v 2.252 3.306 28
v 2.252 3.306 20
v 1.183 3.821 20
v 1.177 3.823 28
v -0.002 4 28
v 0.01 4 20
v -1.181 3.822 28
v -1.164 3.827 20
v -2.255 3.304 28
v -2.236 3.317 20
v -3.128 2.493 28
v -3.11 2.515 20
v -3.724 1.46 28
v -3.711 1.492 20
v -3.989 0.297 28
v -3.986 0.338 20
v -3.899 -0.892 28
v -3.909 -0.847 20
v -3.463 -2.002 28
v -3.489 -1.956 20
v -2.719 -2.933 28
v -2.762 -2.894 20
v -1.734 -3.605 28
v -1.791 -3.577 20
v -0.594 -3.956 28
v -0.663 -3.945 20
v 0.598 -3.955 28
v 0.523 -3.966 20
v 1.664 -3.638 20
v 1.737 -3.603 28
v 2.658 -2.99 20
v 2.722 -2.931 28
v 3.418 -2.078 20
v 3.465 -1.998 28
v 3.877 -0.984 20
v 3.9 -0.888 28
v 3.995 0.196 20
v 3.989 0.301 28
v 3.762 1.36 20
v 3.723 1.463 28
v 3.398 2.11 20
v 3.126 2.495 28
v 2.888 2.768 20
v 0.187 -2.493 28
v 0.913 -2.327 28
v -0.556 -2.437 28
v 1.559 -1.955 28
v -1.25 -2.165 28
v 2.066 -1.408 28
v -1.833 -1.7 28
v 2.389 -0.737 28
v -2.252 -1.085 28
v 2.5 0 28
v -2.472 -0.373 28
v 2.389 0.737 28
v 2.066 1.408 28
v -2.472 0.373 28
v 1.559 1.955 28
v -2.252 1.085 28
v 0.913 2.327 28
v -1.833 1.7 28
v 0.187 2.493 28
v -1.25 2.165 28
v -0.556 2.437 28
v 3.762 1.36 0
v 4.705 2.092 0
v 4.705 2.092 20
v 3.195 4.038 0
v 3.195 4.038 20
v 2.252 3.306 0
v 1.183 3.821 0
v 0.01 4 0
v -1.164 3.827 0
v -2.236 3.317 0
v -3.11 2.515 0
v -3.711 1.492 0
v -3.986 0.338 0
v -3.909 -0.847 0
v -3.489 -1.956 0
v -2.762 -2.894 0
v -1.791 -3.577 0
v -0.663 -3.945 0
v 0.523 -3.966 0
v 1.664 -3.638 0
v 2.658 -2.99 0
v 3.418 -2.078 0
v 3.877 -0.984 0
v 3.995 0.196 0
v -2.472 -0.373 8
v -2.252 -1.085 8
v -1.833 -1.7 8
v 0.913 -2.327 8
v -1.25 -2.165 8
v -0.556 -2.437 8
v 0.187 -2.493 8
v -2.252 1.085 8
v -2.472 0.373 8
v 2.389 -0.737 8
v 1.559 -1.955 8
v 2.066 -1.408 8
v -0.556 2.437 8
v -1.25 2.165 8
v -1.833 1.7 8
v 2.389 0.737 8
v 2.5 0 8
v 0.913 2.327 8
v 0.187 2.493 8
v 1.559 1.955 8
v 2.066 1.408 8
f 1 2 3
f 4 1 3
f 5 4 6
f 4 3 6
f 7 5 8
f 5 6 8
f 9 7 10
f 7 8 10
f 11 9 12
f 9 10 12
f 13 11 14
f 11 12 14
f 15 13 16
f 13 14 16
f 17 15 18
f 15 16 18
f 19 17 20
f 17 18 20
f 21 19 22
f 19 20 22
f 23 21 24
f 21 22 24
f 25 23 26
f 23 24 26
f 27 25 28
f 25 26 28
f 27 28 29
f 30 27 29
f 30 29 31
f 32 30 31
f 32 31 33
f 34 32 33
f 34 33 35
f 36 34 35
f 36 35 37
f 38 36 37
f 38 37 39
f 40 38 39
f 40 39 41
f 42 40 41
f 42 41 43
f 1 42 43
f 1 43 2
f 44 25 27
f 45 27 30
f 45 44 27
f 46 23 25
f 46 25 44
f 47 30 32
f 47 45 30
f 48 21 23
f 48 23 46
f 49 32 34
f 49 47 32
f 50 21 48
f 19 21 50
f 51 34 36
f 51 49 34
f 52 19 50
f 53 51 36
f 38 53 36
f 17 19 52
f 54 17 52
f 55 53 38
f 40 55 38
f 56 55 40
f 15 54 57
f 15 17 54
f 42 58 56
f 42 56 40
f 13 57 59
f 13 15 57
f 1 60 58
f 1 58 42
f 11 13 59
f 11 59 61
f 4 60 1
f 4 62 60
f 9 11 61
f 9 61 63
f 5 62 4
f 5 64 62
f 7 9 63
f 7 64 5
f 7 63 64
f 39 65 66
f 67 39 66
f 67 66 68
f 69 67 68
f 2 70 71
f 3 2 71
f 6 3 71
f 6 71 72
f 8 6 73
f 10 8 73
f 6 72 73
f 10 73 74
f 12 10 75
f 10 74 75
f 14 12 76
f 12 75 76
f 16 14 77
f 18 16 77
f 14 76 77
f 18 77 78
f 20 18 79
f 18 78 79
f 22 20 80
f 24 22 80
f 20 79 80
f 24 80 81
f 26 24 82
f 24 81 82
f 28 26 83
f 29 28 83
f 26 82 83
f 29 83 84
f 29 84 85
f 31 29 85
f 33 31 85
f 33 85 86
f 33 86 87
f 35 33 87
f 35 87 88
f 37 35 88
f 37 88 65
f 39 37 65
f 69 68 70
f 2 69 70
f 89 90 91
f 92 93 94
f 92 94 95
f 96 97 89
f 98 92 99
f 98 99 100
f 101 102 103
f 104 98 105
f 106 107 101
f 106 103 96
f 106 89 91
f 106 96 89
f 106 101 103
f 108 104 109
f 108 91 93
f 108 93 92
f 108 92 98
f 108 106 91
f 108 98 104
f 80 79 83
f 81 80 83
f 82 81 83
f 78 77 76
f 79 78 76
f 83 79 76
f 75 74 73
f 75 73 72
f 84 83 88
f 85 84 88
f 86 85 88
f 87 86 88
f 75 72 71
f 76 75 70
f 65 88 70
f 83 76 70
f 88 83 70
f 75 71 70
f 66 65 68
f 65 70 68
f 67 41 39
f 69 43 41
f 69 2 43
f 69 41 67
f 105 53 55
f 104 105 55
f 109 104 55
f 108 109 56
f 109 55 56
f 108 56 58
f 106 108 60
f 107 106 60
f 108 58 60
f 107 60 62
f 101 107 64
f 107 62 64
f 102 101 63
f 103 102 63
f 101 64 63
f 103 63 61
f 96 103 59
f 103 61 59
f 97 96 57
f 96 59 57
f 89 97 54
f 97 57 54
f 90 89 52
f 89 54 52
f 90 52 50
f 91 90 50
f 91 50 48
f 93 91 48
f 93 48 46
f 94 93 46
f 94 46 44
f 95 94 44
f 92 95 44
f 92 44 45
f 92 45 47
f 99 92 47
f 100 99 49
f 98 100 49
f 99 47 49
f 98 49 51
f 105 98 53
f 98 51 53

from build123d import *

# Parameters (mm, degrees)
EXTRUDE_1_DEPTH     = 20
SKETCH_2_R          = 4
EXTRUDE_2_DEPTH     = 8
SKETCH_3_R          = 2.5
CUT_EXTRUDE_1_DEPTH = 20


with BuildPart() as part:
    # 草图1 → 凸台-拉伸1 (new body)
    with BuildSketch(Plane.XY):
        with BuildLine():
            Line((3.195386911, 4.038125731), (2.251763738, 3.305988516))
            ThreePointArc((2.251763738, 3.305988516), (-3.160315011, -2.452021418), (3.761777443, 1.359790599))
            Line((3.761777443, 1.359790599), (4.705400616, 2.091927813))
            Line((4.705400616, 2.091927813), (3.195386911, 4.038125731))
        make_face()
    extrude(amount=EXTRUDE_1_DEPTH)

    # 草图2 → 凸台-拉伸2 (add)
    with BuildSketch(Plane.XY.offset(20)):
        with Locations(Location((0, 0, 0), (0, 0, 55.740572038))):
            Circle(SKETCH_2_R)
    extrude(amount=EXTRUDE_2_DEPTH)

    # 草图3 → 切除-拉伸1 (cut)
    with BuildSketch(Plane.XY.offset(28)):
        Circle(SKETCH_3_R)
    extrude(amount=-CUT_EXTRUDE_1_DEPTH, mode=Mode.SUBTRACT)


solid = part.part
